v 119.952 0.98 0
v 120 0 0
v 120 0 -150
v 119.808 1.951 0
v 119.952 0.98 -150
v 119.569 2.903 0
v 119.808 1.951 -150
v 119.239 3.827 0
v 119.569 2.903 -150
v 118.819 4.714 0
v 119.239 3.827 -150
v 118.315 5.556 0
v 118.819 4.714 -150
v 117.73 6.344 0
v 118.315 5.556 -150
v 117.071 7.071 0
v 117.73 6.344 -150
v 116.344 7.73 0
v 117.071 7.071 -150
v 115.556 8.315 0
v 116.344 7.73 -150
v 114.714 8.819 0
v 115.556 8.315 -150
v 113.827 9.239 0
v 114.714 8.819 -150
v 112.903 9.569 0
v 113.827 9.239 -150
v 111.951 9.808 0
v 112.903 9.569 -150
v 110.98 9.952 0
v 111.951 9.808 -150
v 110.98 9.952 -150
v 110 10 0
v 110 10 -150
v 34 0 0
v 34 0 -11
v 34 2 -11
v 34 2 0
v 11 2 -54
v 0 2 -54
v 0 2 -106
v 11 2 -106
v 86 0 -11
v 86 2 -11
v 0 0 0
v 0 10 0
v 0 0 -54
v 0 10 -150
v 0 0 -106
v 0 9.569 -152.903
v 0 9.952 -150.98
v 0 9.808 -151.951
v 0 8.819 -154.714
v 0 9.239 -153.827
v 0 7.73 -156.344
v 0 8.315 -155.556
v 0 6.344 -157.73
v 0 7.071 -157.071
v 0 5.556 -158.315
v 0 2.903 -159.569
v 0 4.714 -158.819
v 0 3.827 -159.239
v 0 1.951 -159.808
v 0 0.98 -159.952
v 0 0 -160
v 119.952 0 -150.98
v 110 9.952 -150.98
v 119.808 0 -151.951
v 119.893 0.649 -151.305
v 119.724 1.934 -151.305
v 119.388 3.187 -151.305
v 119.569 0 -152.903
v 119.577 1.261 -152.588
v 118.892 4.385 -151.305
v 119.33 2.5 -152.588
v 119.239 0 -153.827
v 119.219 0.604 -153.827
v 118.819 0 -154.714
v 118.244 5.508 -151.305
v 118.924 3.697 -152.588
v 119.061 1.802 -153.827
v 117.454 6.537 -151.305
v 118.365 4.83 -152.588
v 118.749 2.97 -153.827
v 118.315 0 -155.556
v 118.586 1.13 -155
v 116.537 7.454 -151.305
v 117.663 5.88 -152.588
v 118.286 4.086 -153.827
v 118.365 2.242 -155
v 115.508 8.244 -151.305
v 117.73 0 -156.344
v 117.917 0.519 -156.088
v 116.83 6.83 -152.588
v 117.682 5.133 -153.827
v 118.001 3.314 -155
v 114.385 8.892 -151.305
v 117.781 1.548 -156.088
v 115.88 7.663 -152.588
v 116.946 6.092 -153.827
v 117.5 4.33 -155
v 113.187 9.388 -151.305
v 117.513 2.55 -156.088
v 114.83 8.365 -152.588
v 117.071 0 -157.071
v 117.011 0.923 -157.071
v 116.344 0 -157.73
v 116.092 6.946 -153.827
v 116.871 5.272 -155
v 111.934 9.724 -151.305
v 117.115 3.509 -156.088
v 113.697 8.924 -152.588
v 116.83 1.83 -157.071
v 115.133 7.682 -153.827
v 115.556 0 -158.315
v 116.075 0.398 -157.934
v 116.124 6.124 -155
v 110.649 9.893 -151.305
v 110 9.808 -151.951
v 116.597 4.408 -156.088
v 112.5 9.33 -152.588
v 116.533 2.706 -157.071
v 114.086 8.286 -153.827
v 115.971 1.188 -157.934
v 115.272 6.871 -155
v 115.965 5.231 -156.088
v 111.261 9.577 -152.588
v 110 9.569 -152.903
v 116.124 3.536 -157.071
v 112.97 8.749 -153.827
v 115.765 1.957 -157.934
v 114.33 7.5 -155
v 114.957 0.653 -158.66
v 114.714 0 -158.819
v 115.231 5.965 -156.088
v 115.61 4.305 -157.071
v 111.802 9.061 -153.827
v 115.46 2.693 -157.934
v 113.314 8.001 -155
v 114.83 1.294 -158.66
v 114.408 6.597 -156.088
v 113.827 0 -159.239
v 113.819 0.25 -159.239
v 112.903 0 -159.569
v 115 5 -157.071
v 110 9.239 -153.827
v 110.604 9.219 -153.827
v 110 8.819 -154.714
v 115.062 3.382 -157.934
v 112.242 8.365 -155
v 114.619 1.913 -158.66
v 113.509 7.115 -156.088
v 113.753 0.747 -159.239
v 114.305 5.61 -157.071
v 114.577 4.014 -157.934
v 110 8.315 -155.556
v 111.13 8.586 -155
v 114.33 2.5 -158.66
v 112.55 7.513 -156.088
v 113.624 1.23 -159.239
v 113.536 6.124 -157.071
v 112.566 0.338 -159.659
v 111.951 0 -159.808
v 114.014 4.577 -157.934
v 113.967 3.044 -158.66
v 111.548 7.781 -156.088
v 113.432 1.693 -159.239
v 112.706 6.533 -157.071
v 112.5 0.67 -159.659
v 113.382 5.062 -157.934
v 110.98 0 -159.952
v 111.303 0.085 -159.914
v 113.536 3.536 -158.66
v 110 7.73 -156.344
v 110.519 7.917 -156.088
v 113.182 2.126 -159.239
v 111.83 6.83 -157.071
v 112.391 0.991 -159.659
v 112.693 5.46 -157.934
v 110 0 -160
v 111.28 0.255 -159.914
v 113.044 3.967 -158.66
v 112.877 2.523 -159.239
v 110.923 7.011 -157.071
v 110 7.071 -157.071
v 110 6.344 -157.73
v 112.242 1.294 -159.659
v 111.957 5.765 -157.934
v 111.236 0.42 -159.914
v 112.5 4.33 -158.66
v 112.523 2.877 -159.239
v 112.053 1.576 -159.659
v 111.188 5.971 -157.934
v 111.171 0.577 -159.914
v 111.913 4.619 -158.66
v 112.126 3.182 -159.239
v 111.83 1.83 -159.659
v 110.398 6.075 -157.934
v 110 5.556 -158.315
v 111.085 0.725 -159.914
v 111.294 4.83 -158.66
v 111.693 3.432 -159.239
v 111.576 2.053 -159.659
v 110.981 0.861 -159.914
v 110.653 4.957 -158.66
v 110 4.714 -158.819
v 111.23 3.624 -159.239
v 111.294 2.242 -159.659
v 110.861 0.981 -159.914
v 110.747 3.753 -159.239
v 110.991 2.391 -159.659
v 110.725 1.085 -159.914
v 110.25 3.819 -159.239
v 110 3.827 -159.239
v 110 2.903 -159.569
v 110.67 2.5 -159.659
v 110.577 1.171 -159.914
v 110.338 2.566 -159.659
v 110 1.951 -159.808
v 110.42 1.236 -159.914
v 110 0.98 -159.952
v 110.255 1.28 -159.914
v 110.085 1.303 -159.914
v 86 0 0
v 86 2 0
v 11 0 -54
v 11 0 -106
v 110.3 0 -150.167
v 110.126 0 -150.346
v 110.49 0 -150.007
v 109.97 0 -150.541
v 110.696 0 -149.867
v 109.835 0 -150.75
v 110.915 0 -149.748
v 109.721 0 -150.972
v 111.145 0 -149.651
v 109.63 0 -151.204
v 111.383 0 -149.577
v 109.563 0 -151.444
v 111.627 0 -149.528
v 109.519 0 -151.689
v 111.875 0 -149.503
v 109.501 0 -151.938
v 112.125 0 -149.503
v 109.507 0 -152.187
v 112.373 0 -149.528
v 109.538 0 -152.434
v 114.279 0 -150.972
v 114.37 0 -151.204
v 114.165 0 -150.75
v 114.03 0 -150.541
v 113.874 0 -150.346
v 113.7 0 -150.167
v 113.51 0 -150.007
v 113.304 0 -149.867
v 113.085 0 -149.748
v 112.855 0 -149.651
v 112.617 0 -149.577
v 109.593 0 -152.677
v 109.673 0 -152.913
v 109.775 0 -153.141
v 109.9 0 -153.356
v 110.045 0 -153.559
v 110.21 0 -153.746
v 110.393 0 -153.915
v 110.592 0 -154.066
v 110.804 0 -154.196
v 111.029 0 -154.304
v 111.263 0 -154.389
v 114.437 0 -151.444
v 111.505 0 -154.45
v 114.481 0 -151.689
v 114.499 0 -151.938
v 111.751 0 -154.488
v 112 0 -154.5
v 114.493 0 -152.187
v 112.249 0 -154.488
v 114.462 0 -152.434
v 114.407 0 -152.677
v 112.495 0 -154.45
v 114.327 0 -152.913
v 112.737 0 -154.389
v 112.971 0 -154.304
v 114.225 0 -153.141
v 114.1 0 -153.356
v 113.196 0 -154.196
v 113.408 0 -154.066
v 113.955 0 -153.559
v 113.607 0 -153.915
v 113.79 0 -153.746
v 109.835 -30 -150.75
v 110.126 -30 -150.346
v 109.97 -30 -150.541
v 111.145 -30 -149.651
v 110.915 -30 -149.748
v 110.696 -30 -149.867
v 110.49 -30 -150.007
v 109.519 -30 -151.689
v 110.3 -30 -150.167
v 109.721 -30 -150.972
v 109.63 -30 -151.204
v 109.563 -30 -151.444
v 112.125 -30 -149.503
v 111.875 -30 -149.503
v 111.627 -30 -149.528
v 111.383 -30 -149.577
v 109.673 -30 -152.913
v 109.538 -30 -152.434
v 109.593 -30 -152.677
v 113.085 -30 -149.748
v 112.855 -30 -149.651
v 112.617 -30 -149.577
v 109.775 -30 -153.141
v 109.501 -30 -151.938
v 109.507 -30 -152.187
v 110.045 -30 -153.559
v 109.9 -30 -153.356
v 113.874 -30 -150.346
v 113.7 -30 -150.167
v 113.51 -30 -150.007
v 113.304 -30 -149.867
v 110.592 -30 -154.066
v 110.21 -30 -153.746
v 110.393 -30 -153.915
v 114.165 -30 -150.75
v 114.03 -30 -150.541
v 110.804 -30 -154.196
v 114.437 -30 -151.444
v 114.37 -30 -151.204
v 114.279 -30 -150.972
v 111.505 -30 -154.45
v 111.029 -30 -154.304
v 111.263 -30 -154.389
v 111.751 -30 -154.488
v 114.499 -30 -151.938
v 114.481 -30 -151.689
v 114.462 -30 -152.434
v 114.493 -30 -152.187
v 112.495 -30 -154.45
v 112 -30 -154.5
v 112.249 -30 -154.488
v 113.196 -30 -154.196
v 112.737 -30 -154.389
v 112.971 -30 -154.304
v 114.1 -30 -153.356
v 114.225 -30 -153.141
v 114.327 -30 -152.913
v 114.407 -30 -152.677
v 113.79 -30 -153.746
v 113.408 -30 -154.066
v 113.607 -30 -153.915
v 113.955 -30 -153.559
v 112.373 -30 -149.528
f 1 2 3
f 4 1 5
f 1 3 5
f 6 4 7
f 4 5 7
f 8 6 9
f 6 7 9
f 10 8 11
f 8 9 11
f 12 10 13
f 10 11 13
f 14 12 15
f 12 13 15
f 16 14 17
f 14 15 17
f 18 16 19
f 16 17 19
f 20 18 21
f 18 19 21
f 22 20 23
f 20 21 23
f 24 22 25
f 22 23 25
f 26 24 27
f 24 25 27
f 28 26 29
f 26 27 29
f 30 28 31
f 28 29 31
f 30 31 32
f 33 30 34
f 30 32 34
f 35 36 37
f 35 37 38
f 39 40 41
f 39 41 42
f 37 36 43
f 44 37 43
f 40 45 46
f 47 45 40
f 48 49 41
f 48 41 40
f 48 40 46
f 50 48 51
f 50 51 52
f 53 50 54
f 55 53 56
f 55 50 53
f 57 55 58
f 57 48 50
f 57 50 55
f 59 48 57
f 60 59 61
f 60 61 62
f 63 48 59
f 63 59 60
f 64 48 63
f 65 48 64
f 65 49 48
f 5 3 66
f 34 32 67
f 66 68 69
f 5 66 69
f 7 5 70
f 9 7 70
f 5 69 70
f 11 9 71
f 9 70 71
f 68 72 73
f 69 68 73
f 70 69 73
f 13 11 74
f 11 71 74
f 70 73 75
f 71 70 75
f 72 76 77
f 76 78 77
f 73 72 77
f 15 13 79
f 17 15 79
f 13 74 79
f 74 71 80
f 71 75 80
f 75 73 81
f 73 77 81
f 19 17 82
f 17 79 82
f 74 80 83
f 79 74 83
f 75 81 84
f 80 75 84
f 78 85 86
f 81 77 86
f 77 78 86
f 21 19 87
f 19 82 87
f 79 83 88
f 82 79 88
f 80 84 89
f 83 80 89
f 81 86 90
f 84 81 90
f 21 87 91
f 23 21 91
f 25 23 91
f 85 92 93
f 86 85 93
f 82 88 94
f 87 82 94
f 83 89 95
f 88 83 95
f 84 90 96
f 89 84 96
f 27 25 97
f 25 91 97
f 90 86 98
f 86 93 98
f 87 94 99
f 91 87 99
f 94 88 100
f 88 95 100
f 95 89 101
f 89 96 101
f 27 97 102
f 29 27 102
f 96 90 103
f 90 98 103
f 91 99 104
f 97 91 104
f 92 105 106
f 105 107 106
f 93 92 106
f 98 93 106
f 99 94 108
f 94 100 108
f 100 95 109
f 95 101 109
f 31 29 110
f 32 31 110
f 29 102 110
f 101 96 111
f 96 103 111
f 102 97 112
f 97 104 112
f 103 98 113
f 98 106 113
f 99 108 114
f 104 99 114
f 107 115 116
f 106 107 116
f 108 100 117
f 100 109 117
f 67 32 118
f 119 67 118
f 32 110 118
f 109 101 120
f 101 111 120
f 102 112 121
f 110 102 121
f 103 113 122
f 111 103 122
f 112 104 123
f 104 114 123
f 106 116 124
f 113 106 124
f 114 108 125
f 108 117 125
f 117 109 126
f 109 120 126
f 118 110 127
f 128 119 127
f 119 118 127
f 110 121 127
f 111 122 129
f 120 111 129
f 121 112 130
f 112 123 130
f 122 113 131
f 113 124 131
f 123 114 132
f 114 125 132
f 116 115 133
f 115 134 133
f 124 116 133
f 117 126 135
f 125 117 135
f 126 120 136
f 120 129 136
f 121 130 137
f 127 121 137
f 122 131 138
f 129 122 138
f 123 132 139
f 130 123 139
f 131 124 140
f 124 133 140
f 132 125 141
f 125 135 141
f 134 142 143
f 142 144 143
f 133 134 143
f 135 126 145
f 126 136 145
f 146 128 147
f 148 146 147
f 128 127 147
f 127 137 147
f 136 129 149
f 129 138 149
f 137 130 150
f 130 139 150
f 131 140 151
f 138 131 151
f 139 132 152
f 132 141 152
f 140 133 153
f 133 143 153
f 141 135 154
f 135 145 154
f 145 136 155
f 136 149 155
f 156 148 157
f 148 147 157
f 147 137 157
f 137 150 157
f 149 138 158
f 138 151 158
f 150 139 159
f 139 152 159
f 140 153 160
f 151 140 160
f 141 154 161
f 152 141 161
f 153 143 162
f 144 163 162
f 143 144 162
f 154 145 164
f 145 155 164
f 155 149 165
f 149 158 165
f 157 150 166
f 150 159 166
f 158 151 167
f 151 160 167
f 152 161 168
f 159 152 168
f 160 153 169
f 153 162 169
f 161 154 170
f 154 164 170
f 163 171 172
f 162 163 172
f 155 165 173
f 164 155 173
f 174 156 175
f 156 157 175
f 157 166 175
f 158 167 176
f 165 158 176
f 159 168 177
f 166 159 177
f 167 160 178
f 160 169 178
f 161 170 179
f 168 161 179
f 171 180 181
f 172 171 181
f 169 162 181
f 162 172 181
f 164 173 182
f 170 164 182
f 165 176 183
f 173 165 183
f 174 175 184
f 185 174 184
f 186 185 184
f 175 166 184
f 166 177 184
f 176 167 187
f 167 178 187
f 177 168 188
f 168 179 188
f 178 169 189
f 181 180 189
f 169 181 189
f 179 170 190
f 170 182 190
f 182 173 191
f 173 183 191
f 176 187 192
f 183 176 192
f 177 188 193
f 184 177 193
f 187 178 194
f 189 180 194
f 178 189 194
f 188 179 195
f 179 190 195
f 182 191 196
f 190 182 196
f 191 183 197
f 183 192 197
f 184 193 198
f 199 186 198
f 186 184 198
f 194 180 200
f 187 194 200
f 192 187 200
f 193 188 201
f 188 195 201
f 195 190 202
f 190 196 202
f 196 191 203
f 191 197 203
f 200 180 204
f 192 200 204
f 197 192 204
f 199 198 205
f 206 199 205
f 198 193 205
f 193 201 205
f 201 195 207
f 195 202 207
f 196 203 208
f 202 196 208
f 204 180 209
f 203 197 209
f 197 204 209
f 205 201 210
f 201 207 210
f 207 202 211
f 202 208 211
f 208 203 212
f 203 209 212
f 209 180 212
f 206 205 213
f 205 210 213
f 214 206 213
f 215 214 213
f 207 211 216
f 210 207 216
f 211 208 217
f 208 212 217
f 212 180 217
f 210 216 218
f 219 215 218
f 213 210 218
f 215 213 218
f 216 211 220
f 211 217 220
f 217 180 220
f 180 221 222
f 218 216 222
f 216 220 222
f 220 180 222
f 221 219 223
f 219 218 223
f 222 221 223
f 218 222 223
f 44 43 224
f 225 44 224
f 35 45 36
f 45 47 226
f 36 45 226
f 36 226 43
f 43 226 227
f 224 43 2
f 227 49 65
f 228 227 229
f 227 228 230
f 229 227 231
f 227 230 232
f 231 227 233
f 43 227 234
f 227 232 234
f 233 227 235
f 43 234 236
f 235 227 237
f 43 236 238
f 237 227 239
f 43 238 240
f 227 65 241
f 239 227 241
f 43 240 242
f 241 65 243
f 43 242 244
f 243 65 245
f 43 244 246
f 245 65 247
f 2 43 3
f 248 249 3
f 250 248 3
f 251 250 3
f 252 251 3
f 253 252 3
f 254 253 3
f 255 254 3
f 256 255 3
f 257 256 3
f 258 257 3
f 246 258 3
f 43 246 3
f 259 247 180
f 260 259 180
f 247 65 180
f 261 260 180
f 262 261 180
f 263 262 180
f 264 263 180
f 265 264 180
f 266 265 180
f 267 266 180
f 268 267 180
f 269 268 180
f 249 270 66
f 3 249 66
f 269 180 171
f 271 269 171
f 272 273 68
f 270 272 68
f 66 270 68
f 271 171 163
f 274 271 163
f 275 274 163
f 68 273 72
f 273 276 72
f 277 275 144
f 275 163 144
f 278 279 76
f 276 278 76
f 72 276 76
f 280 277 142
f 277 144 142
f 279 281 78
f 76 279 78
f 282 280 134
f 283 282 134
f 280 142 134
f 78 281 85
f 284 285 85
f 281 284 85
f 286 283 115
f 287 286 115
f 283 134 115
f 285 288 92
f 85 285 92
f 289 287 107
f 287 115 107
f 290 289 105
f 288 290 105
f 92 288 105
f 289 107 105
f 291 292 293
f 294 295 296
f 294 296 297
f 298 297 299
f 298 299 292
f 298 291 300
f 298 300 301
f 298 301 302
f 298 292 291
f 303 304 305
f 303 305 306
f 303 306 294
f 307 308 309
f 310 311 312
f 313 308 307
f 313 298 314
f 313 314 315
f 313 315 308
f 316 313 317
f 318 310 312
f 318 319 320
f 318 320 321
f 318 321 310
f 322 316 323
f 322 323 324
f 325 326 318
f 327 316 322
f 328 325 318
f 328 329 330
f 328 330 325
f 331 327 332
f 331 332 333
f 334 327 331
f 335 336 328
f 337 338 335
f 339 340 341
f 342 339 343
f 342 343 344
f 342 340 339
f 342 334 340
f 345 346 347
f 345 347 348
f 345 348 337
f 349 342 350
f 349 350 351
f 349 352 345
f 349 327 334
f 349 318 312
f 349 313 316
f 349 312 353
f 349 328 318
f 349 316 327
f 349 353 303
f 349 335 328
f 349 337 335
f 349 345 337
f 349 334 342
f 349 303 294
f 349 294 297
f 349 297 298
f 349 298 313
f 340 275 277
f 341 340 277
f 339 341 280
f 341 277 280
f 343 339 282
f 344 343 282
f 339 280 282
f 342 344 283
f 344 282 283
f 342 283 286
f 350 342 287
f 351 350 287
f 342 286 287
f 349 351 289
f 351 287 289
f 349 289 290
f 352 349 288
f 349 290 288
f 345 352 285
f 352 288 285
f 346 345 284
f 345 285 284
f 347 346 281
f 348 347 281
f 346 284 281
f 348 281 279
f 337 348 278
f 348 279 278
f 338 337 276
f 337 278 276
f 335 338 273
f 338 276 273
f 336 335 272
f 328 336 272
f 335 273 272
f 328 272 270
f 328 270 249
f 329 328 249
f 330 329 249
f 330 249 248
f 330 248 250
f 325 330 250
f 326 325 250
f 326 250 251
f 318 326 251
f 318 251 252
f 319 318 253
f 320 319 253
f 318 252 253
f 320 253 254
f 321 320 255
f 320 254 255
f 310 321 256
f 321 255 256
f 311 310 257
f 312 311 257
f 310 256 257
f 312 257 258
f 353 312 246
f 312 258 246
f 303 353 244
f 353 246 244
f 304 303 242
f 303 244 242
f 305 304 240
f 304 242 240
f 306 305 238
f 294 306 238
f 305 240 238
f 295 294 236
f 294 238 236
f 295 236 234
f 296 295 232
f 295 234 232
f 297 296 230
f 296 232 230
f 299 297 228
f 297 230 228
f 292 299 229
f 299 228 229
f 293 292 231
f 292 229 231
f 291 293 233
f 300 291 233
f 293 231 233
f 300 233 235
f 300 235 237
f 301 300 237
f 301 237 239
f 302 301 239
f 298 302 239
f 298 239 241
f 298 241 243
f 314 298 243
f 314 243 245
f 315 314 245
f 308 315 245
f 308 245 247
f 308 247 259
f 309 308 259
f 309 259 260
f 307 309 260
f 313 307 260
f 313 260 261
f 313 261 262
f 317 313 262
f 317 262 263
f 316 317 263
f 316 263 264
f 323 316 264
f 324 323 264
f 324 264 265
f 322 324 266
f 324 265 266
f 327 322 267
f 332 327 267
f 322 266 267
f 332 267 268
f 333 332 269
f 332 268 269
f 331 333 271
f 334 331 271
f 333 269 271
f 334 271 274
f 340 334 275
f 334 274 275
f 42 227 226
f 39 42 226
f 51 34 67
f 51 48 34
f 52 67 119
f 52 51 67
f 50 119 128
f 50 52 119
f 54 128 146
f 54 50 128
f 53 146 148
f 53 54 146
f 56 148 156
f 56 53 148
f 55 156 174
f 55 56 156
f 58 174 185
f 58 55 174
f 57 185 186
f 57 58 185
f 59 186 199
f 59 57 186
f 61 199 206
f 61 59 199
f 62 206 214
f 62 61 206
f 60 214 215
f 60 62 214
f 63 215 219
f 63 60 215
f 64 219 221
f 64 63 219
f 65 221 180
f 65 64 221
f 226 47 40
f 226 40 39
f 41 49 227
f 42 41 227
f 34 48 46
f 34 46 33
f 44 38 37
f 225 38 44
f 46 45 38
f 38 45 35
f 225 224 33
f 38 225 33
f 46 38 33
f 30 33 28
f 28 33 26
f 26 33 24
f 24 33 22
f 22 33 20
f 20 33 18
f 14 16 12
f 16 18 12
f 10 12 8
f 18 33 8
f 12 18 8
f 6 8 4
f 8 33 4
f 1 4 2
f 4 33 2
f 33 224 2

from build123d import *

# Parameters (mm, degrees)
ESQUISSE1_W             = 120
ESQUISSE1_H             = 160
BOSS_EXTRU_1_DEPTH      = 10
CONG_1_R                = 10
CONG_2_R                = 10
ESQUISSE2_R             = 2.5
BOSS_EXTRU_2_DEPTH      = 30
ESQUISSE3_W             = 11
ESQUISSE3_H             = 52
ESQUISSE3_W_2           = 52
ESQUISSE3_H_2           = 11
ENL_V_MAT_EXTRU_1_DEPTH = 2


with BuildPart() as part:
    # Esquisse1 → Boss.-Extru.1 (new body)
    with BuildSketch(Plane(origin=(0, 0, 0), x_dir=(1, 0, 0), z_dir=(0, 1, 0))):
        with Locations((60, 80)):
            Rectangle(ESQUISSE1_W, ESQUISSE1_H)
    extrude(amount=BOSS_EXTRU_1_DEPTH)

    # Congé1
    cong_1_edges = [part.edges().sort_by_distance(p)[0] for p in [
        (120, 10, -80),
    ]]
    fillet(cong_1_edges, radius=CONG_1_R - 0.0001)  # a hair under: the kernel refuses the full size

    # Congé2
    cong_2_edges = [part.edges().sort_by_distance(p)[0] for p in [
        (117.071097101, 7.071097101, -160),
        (55.00005, 10, -160),
    ]]
    fillet(cong_2_edges, radius=CONG_2_R - 0.0001)  # a hair under: the kernel refuses the full size

    # Esquisse2 → Boss.-Extru.2 (add)
    with BuildSketch(Plane.XZ):
        with Locations(Location((112, -152, 0), (0, 0, 270))):
            Circle(ESQUISSE2_R)
    extrude(amount=BOSS_EXTRU_2_DEPTH)

    # Esquisse3 → Enlèv. mat.-Extru.1 (cut)
    with BuildSketch(Plane.XZ):
        with Locations((5.5, -80)):
            Rectangle(ESQUISSE3_W, ESQUISSE3_H)
        with Locations((60, -5.5)):
            Rectangle(ESQUISSE3_W_2, ESQUISSE3_H_2)
    extrude(amount=-ENL_V_MAT_EXTRU_1_DEPTH, mode=Mode.SUBTRACT)


solid = part.part
